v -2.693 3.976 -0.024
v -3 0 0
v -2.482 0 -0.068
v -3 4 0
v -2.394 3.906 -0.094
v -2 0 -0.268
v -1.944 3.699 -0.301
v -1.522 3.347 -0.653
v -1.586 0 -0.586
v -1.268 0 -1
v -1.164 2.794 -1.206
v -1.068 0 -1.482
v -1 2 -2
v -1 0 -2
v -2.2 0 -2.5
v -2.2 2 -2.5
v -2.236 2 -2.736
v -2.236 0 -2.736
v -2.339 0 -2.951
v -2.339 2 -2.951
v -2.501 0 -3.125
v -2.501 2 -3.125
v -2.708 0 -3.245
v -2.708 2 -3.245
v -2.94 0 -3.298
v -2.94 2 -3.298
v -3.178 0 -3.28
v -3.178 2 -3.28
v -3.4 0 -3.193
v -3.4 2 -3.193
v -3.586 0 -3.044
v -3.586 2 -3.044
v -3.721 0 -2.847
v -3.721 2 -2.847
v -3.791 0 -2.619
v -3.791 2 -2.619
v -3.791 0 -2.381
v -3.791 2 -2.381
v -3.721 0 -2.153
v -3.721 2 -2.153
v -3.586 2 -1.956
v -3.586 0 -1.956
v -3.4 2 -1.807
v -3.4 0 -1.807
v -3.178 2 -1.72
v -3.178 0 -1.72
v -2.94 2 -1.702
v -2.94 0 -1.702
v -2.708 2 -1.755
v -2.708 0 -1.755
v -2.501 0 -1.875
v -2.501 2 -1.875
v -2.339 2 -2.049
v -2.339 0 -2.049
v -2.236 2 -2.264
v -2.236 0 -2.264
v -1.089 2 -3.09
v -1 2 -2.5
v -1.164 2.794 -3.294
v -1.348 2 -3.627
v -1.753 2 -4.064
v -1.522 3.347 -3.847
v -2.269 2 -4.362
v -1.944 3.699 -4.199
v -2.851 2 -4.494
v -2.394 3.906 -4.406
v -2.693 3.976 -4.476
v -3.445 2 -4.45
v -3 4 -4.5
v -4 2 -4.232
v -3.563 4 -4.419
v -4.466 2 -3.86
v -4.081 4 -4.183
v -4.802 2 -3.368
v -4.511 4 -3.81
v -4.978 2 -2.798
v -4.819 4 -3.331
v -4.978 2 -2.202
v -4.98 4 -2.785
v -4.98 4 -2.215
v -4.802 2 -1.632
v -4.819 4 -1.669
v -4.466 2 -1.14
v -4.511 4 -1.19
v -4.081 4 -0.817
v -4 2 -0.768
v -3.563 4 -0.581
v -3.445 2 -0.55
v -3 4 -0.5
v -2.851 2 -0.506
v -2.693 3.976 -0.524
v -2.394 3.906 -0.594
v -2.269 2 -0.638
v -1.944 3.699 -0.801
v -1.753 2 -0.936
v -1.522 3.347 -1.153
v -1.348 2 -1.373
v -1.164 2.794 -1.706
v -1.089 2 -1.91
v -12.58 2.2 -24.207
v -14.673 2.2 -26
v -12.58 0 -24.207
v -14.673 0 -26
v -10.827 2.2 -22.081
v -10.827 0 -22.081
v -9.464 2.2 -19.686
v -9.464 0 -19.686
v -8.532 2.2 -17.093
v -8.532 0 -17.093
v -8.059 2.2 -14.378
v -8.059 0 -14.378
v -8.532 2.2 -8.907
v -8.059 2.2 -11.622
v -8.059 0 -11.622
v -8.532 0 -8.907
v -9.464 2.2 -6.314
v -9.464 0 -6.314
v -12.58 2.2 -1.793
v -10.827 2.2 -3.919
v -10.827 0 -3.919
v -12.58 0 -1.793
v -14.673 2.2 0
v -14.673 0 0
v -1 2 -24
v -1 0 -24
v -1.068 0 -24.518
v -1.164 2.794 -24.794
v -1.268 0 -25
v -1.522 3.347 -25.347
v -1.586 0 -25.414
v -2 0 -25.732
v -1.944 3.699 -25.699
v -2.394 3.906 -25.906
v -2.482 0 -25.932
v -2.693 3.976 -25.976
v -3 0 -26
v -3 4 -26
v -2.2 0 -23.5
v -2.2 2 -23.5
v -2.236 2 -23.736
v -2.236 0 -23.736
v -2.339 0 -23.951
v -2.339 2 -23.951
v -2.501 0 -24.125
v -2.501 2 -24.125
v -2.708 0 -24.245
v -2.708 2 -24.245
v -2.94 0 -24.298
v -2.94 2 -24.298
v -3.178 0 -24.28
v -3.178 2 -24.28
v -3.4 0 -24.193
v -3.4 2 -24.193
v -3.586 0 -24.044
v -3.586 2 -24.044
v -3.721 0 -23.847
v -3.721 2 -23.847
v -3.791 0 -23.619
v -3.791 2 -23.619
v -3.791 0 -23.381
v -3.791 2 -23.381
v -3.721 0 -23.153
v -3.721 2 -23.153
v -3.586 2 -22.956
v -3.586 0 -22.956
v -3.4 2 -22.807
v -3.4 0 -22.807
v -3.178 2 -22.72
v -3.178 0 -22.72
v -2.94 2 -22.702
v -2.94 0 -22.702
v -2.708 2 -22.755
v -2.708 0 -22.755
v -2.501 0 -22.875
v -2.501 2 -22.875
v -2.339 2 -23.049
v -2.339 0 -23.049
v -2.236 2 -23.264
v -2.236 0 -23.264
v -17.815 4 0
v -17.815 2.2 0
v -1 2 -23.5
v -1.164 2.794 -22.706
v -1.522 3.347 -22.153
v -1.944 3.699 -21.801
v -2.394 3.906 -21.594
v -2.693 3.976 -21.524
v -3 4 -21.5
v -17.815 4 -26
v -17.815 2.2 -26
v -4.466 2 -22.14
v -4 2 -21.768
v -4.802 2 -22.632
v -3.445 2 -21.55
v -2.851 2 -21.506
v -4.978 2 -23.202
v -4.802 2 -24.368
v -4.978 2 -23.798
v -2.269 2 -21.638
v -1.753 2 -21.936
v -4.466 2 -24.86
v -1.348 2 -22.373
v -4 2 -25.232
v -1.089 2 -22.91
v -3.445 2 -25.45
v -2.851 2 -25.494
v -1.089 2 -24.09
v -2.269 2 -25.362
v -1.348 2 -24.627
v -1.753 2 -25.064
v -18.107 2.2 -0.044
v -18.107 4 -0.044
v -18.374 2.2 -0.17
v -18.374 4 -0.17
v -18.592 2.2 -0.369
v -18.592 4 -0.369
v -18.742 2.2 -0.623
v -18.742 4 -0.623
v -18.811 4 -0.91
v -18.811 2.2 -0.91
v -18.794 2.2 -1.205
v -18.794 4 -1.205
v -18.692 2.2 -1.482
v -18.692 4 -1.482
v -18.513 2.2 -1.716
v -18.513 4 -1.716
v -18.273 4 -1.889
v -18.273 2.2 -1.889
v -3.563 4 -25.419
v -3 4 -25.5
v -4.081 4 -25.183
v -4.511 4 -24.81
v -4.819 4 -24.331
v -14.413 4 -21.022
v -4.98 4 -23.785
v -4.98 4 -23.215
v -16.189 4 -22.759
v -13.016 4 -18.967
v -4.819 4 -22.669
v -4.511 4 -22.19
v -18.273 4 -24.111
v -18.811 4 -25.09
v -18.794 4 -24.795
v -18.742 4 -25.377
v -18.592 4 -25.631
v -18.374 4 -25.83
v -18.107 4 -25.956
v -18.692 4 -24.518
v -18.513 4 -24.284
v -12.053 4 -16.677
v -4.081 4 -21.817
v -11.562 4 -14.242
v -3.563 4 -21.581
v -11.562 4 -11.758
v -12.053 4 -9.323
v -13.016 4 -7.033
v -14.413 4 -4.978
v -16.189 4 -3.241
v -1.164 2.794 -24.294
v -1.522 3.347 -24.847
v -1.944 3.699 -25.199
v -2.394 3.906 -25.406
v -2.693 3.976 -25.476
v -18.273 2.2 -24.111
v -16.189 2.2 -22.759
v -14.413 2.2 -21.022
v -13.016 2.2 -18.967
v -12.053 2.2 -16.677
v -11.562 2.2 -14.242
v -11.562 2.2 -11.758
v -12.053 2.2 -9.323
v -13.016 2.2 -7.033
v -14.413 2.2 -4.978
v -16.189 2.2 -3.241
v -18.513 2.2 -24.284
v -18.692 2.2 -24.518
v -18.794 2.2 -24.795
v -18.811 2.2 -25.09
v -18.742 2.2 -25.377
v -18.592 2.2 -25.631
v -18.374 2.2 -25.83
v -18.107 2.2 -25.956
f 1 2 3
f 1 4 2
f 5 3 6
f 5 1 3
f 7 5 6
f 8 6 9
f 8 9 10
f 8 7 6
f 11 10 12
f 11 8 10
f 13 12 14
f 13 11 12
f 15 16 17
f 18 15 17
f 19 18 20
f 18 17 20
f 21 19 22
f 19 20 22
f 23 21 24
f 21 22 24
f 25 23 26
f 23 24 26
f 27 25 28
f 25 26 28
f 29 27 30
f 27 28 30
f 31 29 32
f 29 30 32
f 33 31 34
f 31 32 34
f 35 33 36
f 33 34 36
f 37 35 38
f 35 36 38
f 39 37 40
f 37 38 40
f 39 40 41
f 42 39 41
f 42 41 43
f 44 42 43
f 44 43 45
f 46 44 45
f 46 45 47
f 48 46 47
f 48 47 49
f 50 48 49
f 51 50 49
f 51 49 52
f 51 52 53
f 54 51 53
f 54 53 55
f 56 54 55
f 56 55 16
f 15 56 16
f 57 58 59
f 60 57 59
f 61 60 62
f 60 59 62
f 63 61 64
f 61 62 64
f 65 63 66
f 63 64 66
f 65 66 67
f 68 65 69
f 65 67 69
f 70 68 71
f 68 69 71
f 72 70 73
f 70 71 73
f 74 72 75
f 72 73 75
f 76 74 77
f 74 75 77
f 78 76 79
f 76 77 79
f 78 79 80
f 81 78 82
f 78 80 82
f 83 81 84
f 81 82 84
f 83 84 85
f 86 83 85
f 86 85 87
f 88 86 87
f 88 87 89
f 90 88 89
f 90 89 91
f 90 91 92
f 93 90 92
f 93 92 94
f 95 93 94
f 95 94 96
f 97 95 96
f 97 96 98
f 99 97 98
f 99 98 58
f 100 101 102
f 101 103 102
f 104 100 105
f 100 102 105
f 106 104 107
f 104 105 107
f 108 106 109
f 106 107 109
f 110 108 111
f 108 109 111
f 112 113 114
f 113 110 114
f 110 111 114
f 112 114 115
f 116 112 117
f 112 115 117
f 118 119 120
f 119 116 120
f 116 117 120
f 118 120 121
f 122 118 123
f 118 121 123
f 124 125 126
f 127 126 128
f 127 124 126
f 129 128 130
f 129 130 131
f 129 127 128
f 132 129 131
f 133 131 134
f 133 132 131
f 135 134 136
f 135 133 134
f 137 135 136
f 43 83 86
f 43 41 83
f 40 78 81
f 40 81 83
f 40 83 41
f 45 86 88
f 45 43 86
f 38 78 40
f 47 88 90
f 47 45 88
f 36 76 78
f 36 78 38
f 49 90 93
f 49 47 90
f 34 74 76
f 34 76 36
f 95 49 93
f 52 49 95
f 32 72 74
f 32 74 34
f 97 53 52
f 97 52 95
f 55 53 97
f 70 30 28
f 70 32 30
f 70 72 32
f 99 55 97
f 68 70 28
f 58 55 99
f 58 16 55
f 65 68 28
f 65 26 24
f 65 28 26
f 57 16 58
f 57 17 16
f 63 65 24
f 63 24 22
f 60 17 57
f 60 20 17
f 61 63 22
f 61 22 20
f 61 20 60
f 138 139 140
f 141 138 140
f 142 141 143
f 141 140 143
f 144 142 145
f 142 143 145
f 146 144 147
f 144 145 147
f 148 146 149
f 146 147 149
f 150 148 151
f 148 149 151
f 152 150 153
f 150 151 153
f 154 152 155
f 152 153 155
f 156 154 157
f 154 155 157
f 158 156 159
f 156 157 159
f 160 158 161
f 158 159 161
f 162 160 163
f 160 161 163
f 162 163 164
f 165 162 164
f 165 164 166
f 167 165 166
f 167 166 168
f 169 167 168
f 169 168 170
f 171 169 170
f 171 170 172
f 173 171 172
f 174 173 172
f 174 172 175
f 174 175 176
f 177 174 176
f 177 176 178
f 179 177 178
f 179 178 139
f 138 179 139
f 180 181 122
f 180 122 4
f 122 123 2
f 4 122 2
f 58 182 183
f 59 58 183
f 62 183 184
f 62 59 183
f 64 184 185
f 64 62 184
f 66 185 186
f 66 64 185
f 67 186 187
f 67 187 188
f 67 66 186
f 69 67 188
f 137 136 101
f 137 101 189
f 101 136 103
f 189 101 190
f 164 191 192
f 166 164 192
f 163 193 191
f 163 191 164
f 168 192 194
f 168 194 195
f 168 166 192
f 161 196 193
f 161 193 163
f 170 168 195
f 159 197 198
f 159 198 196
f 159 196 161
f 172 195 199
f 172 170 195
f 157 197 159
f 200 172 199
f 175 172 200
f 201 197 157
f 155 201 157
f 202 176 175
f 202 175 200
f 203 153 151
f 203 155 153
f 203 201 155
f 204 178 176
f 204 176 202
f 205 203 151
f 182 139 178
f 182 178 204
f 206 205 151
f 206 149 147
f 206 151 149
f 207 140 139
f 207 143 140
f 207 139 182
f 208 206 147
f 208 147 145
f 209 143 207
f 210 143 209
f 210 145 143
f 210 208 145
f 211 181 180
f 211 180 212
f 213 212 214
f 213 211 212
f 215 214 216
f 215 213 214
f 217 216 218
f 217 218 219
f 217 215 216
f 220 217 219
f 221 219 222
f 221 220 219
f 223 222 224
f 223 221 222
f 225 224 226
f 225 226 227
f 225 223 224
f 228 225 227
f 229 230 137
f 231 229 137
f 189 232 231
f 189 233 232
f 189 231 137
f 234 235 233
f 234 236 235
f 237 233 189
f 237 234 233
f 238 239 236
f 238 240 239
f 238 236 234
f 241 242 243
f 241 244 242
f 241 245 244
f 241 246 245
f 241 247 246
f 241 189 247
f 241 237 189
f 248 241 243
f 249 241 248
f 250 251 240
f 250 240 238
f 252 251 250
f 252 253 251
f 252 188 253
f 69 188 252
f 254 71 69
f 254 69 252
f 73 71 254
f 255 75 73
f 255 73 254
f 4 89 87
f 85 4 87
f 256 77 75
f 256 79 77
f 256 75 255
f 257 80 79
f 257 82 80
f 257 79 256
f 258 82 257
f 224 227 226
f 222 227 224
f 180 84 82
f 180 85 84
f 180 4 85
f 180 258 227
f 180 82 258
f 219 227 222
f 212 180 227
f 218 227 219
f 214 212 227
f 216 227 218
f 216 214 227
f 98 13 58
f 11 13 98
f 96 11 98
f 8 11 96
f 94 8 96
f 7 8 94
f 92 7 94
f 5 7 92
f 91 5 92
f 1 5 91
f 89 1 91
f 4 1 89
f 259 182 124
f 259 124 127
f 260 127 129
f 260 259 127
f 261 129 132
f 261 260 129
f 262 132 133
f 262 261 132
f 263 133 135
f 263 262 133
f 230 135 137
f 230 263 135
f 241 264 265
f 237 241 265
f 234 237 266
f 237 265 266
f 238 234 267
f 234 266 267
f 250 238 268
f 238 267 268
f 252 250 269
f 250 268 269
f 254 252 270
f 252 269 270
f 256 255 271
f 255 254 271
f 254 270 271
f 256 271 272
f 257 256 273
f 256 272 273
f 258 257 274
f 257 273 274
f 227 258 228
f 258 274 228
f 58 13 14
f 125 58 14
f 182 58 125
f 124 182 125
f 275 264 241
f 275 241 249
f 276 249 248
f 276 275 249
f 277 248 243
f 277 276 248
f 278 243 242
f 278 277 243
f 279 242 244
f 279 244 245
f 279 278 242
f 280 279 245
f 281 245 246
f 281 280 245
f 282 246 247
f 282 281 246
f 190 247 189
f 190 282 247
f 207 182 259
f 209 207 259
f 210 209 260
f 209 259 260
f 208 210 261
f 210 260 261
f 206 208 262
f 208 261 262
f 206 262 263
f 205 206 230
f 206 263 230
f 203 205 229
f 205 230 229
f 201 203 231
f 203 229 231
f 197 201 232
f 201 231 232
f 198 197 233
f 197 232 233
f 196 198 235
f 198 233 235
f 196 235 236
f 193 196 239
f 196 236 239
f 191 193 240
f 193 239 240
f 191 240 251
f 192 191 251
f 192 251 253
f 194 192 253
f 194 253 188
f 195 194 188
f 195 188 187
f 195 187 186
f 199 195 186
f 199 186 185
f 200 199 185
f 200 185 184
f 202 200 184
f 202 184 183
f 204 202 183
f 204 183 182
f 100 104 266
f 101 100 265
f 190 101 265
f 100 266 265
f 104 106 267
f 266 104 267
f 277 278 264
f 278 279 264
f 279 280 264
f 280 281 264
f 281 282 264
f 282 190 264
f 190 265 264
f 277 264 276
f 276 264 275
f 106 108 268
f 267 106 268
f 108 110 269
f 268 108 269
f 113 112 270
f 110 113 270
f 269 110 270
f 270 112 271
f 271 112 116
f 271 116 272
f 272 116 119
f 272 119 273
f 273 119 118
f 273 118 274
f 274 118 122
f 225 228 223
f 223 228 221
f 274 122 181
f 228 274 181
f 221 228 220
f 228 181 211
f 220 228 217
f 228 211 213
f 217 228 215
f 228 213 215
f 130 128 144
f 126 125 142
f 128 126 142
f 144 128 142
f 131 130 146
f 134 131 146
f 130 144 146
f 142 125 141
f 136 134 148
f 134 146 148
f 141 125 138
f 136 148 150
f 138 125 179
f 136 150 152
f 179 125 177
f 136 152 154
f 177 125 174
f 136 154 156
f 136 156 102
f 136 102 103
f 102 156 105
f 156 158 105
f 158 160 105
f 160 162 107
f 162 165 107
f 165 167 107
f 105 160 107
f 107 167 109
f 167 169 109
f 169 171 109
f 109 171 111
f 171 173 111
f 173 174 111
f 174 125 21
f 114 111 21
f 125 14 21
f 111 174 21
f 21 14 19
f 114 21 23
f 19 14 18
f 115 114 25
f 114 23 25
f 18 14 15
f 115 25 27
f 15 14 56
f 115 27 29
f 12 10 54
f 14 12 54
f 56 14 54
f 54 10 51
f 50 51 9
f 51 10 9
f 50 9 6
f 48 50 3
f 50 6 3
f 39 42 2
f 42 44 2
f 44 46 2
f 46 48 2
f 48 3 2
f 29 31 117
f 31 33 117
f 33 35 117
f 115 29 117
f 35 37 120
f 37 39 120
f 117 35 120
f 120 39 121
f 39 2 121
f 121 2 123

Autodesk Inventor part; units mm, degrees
ref_plane "YZ Plane" through (0, 0, 0) normal (1, 0, 0) x (0, 1, 0)
ref_plane "XZ Plane" through (0, 0, 0) normal (0, 1, 0) x (-1, 0, 0)
ref_plane "XY Plane" through (0, 0, 0) normal (0, 0, 1) x (1, 0, 0)
sketch "スケッチ1" plane through (0, 0, 0) normal (0, 1, 0) x (-1, 0, 0)
  line L0 (24, 0) -> (0, 0)
  line L1 (0, 0) -> (0, -26)
  line L2 (0, -26) -> (24, -26)
  line L3 (24, -26) -> (24, 0)
  circle A0 centre (24, -13) radius 13 construction
  circle A1 centre (24, -13) radius 12.5
  circle A2 centre (24, -13) radius 16
  point P0 (24, -25.5)
  point P1 (24, -0.5)
  point P2 (14.6726, 0)
  point P3 (14.6726, -26)
  dimension "d0" = 26
  dimension "d1" = 24
  dimension "d2" = 25
  dimension "d3" = 32
extrude "押し出し1" add sketch "スケッチ1" along normal blind 4 contours L3 A1 L2 A2 L0 | A2 L2 L1 L0 picked at (14.0879, -23.9339)
extrude "押し出し2" cut sketch "スケッチ1" along normal blind 2.2 contours L3 A1 L2 A2 L0 picked at (14.0879, -23.9339)
fillet "フィレット1" radius 1 4 edges at (-24, 3.1, -0.5) (-24, 3.1, 0) (-24, 3.1, -26) (-24, 3.1, -25.5)
sketch "スケッチ2" plane through (0, 4, 0) normal (0, 1, 0) x (1, 0, 0)
  circle A0 centre (-3, 2.5) radius 0.85 construction
  circle A1 centre (-3, 23.5) radius 0.85 construction
  circle A2 centre (-3, 2.5) radius 0.8
  circle A3 centre (-3, 23.5) radius 0.8
  point P0 (0, 0)
  dimension "d9" = 1.6
  dimension "d10" = 1.6
extrude "押し出し3" cut sketch "スケッチ2" against normal through all
sketch "スケッチ4" plane through (0, 4, 0) normal (0, 1, 0) x (1, 0, 0)
  line L0 (0, 26) -> (-17.8153, 26) projected
  line L1 (0, 0) -> (-1, 0)
  line L2 (-1, 0) -> (-1, 26)
  line L3 (-1, 26) -> (0, 26)
  line L4 (0, 26) -> (0, 0)
  dimension "d20" = 1
extrude "押し出し5" cut sketch "スケッチ4" against normal through all
sketch "スケッチ3" plane through (0, 4, 0) normal (0, 1, 0) x (1, 0, 0)
  circle A0 centre (-3, 2.5) radius 0.8 projected
  circle A1 centre (-3, 23.5) radius 0.8 projected
  circle A2 centre (-3, 2.5) radius 2
  circle A3 centre (-3, 23.5) radius 2
  point P0 (0, 0)
  dimension "d13" = 4
  dimension "d14" = 4
fillet "フィレット3" radius 2 3 edges at (-1, 4, -13) (-1, 2, 0) (-1, 2, -26)
extrude "押し出し6" cut sketch "スケッチ3" against normal blind 2
properties part number "joit_cover"
